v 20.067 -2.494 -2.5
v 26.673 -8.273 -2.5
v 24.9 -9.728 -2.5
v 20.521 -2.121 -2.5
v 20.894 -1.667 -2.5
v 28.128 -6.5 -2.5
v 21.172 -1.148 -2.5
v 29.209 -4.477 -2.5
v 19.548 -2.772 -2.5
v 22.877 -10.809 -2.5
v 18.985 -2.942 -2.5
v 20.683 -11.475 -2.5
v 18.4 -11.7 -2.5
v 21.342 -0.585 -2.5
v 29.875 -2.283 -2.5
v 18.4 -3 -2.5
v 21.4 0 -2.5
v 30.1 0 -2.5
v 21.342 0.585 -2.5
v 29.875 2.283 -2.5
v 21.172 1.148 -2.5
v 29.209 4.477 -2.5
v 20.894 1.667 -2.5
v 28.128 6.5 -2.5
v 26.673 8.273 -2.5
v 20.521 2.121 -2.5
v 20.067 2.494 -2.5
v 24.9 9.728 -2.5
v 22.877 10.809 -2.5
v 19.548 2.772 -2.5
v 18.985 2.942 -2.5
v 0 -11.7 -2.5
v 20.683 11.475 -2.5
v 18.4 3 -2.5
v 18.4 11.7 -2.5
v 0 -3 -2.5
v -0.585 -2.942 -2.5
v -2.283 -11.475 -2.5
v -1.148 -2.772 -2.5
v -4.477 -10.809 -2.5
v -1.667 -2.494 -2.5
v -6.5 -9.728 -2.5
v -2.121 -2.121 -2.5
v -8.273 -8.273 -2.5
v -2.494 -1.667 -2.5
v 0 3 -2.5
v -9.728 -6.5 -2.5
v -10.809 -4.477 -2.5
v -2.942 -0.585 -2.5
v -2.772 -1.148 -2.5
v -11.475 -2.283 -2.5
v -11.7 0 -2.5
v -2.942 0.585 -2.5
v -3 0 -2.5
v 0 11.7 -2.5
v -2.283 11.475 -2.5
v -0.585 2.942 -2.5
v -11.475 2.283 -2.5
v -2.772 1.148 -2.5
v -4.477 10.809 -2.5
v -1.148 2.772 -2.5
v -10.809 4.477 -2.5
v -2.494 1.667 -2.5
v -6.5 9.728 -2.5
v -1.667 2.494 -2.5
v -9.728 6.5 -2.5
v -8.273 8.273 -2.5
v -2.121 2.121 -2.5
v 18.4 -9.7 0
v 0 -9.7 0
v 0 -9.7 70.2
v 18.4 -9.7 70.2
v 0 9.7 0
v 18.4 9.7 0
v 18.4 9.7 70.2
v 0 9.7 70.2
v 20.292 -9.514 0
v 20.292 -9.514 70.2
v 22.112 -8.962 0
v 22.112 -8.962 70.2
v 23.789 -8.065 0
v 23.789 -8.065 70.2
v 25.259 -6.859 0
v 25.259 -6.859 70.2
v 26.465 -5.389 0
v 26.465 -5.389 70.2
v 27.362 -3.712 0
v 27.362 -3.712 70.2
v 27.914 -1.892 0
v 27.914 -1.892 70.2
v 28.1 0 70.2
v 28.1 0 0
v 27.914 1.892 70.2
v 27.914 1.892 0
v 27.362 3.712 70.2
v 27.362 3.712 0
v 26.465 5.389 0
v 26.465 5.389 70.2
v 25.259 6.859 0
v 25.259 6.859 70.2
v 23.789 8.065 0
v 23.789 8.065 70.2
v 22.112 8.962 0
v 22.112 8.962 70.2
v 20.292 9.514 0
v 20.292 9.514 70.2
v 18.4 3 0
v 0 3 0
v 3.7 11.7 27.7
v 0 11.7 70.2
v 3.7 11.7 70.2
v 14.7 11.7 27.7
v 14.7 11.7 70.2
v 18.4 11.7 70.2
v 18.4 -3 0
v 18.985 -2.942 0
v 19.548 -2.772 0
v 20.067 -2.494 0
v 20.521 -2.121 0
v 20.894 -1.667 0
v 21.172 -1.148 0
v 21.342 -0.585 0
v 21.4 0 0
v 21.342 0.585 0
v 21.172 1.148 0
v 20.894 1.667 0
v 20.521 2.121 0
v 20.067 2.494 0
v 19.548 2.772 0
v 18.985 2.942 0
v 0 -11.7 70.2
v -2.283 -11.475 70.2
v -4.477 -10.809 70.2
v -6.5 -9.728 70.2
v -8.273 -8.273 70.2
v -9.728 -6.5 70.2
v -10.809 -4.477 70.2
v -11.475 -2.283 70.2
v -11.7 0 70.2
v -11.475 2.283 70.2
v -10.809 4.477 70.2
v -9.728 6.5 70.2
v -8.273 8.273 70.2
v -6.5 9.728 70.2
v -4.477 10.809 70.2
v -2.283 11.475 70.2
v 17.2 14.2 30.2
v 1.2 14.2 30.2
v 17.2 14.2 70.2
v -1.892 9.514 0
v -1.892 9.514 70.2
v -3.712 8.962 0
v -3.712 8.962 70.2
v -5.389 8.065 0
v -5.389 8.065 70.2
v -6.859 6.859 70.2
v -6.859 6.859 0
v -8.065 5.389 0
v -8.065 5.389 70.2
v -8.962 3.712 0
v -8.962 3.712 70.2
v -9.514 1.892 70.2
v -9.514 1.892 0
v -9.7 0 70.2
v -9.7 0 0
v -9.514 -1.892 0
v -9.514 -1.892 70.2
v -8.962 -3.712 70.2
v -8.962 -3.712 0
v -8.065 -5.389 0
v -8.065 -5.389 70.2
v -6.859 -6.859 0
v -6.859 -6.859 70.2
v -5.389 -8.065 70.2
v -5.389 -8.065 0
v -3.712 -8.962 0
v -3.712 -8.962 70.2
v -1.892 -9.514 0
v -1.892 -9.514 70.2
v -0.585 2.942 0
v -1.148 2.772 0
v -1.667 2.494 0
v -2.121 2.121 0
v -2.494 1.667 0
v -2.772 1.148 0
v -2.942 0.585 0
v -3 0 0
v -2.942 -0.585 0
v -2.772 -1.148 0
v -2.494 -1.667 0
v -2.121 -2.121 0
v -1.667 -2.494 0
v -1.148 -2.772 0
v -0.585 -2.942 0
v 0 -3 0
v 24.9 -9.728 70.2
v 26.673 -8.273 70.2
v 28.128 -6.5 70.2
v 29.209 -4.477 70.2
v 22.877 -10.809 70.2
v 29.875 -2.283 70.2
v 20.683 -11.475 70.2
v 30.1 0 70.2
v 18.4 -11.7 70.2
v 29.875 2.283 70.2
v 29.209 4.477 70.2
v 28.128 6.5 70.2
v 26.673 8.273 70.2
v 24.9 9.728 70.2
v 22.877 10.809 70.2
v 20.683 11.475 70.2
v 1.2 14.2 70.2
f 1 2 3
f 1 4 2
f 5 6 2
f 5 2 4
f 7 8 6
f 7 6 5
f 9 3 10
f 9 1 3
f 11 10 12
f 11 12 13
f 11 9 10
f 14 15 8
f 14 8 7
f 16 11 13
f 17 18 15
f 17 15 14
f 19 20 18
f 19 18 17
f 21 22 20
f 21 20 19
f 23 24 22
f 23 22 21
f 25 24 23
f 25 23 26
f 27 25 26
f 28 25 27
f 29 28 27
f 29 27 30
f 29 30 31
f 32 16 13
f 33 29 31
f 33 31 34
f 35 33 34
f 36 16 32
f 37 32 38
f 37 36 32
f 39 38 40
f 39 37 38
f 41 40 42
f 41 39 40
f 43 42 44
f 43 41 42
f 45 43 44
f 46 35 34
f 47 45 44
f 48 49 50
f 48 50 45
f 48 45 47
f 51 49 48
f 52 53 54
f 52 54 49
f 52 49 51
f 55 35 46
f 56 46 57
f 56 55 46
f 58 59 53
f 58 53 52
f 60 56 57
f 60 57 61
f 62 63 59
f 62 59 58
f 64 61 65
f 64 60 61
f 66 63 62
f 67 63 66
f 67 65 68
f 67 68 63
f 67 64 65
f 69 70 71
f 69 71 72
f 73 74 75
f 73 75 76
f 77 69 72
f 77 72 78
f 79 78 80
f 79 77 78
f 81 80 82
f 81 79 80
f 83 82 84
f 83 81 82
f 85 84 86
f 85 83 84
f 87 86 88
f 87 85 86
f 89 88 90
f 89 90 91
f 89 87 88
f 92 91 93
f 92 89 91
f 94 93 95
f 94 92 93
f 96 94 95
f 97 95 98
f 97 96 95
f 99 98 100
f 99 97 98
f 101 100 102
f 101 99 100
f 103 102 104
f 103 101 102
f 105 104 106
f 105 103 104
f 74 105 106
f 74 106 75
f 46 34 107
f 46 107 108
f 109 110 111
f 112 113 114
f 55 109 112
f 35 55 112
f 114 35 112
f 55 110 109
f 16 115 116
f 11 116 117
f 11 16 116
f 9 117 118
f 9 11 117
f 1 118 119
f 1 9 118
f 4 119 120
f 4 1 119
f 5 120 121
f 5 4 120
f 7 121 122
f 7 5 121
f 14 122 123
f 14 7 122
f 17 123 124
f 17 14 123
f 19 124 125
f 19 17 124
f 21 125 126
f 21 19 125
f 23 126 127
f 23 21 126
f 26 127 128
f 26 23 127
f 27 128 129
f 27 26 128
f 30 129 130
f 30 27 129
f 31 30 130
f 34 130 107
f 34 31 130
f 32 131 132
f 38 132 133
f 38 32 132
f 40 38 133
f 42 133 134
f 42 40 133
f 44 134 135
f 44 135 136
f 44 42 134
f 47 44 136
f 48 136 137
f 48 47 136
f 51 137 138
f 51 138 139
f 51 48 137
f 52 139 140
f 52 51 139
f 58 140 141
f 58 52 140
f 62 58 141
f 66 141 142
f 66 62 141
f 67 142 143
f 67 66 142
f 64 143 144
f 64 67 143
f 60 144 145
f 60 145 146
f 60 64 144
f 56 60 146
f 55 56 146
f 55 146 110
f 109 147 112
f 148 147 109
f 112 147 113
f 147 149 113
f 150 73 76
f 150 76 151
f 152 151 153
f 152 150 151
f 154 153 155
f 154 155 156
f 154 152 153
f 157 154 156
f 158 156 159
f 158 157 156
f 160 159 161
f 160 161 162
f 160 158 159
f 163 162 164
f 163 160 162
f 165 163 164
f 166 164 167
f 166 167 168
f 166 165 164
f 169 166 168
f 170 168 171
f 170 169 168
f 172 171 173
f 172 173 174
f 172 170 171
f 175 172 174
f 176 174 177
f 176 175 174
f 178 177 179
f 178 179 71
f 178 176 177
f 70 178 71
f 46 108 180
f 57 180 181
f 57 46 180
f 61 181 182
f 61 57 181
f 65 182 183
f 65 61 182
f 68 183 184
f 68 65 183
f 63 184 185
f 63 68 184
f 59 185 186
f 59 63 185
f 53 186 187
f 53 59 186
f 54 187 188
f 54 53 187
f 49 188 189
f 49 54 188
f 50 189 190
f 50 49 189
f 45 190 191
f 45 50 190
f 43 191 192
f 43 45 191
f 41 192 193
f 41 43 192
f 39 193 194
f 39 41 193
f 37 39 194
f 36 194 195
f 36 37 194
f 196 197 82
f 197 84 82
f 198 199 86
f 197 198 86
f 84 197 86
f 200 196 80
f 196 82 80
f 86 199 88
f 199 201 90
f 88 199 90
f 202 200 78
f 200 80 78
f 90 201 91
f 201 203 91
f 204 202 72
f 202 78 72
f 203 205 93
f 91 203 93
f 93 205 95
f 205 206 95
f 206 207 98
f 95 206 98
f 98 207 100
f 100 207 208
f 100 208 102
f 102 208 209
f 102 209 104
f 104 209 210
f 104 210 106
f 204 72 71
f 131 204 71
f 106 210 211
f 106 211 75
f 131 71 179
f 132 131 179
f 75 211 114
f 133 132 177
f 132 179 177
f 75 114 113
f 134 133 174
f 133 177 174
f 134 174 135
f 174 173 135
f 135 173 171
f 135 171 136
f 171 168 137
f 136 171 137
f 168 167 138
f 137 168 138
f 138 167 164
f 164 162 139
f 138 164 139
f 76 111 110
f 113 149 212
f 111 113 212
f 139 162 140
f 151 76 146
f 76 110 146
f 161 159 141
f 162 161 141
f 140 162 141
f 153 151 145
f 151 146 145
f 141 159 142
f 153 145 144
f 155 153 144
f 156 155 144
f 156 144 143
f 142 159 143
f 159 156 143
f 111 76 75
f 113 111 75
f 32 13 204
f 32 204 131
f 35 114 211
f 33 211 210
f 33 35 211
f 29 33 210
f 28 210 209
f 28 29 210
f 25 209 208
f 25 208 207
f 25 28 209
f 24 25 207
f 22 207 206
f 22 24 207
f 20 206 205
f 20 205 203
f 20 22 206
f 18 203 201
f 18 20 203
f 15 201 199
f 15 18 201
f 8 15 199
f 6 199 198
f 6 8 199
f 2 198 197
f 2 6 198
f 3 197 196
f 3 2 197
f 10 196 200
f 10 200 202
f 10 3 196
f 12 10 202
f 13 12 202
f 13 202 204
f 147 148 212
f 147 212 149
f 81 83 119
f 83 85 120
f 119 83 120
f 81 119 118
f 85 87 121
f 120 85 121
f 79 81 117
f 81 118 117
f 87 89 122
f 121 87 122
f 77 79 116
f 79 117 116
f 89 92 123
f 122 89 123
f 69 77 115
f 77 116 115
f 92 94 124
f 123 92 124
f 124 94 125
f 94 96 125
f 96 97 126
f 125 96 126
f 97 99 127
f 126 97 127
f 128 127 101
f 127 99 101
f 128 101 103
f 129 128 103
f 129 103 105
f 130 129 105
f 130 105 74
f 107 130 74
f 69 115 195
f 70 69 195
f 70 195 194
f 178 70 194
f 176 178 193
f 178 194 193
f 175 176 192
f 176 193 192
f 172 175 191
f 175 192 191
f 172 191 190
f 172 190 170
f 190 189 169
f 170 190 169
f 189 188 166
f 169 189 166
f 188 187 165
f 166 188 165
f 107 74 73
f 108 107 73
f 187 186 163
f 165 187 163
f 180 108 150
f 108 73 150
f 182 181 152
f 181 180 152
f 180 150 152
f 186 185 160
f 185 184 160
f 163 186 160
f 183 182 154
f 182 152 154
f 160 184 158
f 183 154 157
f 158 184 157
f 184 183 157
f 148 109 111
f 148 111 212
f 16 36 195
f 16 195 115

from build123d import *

# Parameters (mm, degrees)
Y_KSEKLIK_EKSTR_ZYON1_DEPTH = 70.2
Y_KSEKLIK_EKSTR_ZYON2_START = 2.5
Y_KSEKLIK_EKSTR_ZYON2_DEPTH = 2.5
Y_KSEKLIK_EKSTR_ZYON5_DEPTH = 40
PAH1_SIZE                   = 2.5
KES_EKSTR_ZYON1_DEPTH       = 10


with BuildPart() as part:
    # Çizim1 → Yükseklik-Ekstrüzyon1 (new body)
    with BuildSketch(Plane.XY):
        with BuildLine():
            Line((0, 11.7), (18.4, 11.7))
            ThreePointArc((18.4, 11.7), (30.1, 0), (18.4, -11.7))
            Line((18.4, -11.7), (0, -11.7))
            ThreePointArc((0, -11.7), (-11.7, 0), (0, 11.7))
        make_face()
        with BuildLine():
            ThreePointArc((0, 9.7), (-9.7, 0), (0, -9.7))
            Line((0, -9.7), (18.4, -9.7))
            ThreePointArc((18.4, -9.7), (28.1, 0), (18.4, 9.7))
            Line((18.4, 9.7), (0, 9.7))
        make_face(mode=Mode.SUBTRACT)
    extrude(amount=Y_KSEKLIK_EKSTR_ZYON1_DEPTH)

    # Çizim2 → Yükseklik-Ekstrüzyon2 (add)
    with BuildSketch(Plane(origin=(0, 0, 0), x_dir=(-1, 0, 0), z_dir=(0, 0, -1)).offset(Y_KSEKLIK_EKSTR_ZYON2_START)):
        with BuildLine():
            Line((0, 11.7), (-18.4, 11.7))
            ThreePointArc((-18.4, 11.7), (-30.1, 0), (-18.4, -11.7))
            Line((-18.4, -11.7), (0, -11.7))
            ThreePointArc((0, -11.7), (11.7, 0), (0, 11.7))
        make_face()
    extrude(amount=-Y_KSEKLIK_EKSTR_ZYON2_DEPTH)

    # Çizim8 → Yükseklik-Ekstrüzyon5 (add)
    with BuildSketch(Plane.XY.offset(70.2)):
        Polygon((14.7, 11.7), (3.7, 11.7), (1.2, 14.2), (17.2, 14.2), align=None)
    extrude(amount=-Y_KSEKLIK_EKSTR_ZYON5_DEPTH)

    # Pah1
    pah1_edges = [part.edges().sort_by_distance(p)[0] for p in [
        (9.2, 11.7, 30.2),
    ]]
    chamfer(pah1_edges, length=PAH1_SIZE - 0.0001)  # a hair under: the kernel refuses the full size

    # Çizim9 → Kes-Ekstrüzyon1 (cut)
    with BuildSketch(Plane(origin=(0, 0, -2.5), x_dir=(-1, 0, 0), z_dir=(0, 0, -1))):
        with BuildLine():
            Line((0, -3), (-18.4, -3))
            ThreePointArc((-18.4, -3), (-21.4, 0), (-18.4, 3))
            Line((-18.4, 3), (0, 3))
            ThreePointArc((0, 3), (3, 0), (0, -3))
        make_face()
    extrude(amount=-KES_EKSTR_ZYON1_DEPTH, mode=Mode.SUBTRACT)


solid = part.part
